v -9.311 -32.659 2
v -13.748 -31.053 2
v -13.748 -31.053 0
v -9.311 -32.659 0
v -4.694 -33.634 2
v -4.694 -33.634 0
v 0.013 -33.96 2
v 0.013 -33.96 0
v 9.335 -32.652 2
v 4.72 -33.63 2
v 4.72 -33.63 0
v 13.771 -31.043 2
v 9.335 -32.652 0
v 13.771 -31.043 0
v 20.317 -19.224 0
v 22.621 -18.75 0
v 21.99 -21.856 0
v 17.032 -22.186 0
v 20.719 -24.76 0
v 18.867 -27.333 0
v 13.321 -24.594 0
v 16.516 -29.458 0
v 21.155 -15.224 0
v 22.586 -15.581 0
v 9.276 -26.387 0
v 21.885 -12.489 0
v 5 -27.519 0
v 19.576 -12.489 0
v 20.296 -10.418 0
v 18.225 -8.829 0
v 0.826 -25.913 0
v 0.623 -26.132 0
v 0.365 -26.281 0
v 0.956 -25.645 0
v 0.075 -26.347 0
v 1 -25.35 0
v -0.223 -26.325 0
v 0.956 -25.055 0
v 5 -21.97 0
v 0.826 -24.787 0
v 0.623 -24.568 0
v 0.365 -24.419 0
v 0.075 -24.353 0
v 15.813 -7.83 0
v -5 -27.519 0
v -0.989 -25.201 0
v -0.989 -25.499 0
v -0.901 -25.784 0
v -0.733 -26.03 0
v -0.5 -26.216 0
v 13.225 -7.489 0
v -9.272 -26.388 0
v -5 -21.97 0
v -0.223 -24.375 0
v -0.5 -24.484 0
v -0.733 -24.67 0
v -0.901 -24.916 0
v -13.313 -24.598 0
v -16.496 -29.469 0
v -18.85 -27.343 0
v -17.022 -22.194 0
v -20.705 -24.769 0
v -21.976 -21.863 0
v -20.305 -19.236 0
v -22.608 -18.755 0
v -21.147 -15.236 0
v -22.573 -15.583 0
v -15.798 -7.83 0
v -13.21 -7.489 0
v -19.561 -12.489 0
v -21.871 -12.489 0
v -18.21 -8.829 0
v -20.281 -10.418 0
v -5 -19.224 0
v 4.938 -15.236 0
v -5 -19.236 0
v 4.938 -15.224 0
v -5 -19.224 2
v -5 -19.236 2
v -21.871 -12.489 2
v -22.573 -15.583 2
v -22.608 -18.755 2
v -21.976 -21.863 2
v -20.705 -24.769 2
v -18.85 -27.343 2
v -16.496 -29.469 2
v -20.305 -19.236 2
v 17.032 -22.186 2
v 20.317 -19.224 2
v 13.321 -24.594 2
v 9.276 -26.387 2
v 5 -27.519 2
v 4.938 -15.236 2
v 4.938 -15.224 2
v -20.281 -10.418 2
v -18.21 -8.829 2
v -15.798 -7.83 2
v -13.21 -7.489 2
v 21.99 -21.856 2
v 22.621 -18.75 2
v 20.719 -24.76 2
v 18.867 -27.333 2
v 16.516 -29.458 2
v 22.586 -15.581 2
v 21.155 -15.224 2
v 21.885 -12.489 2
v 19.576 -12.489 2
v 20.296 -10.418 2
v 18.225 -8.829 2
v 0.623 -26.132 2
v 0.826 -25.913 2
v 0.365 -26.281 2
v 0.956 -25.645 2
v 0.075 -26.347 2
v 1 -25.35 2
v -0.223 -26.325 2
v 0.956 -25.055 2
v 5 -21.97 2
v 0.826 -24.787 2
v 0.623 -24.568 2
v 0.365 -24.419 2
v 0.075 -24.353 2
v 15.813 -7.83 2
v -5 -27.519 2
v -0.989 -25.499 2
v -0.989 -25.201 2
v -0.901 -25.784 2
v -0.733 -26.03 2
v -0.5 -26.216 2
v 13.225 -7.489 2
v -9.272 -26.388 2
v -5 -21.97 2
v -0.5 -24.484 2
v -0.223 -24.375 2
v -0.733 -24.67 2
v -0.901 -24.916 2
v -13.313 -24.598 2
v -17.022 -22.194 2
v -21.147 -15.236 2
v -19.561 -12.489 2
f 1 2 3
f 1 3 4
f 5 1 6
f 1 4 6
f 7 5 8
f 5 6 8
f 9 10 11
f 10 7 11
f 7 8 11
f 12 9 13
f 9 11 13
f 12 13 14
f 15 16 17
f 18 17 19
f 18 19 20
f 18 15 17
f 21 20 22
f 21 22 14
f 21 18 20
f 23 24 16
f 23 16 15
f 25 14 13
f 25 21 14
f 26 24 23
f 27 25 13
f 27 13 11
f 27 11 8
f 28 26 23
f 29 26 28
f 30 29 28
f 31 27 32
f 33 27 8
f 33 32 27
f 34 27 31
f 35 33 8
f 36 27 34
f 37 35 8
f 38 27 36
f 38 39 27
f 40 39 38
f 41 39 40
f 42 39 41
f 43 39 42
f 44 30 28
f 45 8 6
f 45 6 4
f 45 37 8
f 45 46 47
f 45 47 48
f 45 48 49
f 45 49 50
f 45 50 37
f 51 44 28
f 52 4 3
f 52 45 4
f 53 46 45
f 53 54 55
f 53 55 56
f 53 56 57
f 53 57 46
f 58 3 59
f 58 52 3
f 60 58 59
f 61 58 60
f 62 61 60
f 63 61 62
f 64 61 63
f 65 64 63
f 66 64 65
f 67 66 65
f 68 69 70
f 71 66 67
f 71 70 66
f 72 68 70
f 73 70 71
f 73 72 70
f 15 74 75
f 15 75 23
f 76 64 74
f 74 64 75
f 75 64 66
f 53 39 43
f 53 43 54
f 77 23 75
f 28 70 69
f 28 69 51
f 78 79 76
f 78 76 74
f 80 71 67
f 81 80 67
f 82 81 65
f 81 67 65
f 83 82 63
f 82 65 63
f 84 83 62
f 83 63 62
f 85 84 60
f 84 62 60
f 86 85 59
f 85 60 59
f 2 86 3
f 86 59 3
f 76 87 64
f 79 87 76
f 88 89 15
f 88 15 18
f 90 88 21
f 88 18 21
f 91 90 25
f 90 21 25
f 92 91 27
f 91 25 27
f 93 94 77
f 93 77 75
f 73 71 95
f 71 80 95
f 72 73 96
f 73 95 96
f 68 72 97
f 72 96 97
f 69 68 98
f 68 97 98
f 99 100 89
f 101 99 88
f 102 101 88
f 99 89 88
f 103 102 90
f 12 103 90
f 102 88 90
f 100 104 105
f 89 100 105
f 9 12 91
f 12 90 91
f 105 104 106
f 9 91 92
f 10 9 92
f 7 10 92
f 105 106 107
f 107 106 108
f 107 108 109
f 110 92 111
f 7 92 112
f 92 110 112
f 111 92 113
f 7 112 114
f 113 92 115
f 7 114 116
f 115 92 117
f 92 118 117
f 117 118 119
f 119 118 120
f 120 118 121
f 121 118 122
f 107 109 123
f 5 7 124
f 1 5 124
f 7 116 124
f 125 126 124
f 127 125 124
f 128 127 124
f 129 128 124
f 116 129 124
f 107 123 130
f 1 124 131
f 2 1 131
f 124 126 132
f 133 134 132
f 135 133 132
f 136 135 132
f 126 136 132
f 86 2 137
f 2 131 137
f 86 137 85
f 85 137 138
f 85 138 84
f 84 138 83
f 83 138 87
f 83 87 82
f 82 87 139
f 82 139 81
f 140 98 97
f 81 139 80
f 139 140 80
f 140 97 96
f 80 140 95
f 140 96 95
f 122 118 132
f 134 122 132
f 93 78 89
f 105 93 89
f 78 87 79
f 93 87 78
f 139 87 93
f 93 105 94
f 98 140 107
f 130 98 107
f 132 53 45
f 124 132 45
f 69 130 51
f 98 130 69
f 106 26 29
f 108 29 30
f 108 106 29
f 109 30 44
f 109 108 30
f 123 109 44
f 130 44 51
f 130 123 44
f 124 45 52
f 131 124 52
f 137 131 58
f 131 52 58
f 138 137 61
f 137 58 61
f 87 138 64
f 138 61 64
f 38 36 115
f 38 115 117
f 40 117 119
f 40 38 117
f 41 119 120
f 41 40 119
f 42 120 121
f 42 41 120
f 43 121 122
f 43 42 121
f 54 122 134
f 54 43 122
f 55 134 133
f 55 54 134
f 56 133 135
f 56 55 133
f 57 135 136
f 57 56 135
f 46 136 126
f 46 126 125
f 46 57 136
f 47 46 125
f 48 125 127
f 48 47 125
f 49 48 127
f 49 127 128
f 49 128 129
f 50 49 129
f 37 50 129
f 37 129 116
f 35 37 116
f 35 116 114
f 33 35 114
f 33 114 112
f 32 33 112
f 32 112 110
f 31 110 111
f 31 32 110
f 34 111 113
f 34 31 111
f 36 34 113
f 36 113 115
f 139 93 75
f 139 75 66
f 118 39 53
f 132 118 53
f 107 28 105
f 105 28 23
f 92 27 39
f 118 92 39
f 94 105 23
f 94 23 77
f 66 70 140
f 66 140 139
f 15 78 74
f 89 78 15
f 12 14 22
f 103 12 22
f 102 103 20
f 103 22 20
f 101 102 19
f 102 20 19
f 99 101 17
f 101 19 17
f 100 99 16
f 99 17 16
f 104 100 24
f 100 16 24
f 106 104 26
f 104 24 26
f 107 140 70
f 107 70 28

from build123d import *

# Parameters (mm, degrees)
SKETCH1_R           = 0.9999999999999973
BOSS_EXTRUDE1_DEPTH = 2
BOSS_EXTRUDE2_DEPTH = 2
BOSS_EXTRUDE3_DEPTH = 2
BOSS_EXTRUDE4_DEPTH = 2
BOSS_EXTRUDE6_DEPTH = 2
CUT_EXTRUDE5_DEPTH  = 10
CUT_EXTRUDE6_DEPTH  = 10
FILLET3_R           = 10
FILLET4_R           = 15


with BuildPart() as part:
    # Sketch1 → Boss-Extrude1 (new body)
    with BuildSketch(Plane.XY):
        with BuildLine():
            Line((-25.026699742262835, -12.489403509000002), (-31.579999999831756, -12.489403509000002))
            ThreePointArc((-31.579999999831788, -12.489403509000118), (-4.3876e-13, -33.96), (31.579999999831465, -12.489403509000935))
            Line((31.579999999831173, -12.489403509000002), (25.026699742262835, -12.489403509000002))
            ThreePointArc((25.026699742262835, -12.489403508999999), (16.78917371704707, -22.3706179149977), (5.000000000000879, -27.51946402094327))
            Line((5.000000000000001, -27.519464020943122), (5.000000000000001, -21.97))
            Line((5.000000000000001, -21.97), (0, -21.97))
            Line((0, -21.97), (-5.000000000000001, -21.970000000000002))
            Line((-5.000000000000001, -21.970000000000002), (-5.000000000000001, -27.519464020943126))
            ThreePointArc((-5.000000000000872, -27.519464020943275), (-16.789173717047063, -22.370617914997695), (-25.02669974226283, -12.489403508999999))
        make_face()
        with Locations((2.25e-15, -25.35)):
            Circle(SKETCH1_R, mode=Mode.SUBTRACT)
    extrude(amount=BOSS_EXTRUDE1_DEPTH)

    # Sketch2 → Boss-Extrude2 (add)
    with BuildSketch(Plane.XY.offset(2)):
        with BuildLine():
            Line((-31.57999999983184, -12.489403509000002), (-25.026699742262828, -12.489403509000002))
            Line((-25.026699742262828, -12.489403509000002), (0, -12.489403509000002))
            Line((0, -12.489403509000002), (25.026699742262828, -12.489403509000002))
            Line((25.026699742262828, -12.489403509000002), (31.57999999983184, -12.489403509000002))
            ThreePointArc((31.57999999983184, -12.489403509000002), (30.972585231224635, -9.734010611787788), (29.262941504232284, -7.489403509000002))
            Line((29.262941504232288, -7.489403509000003), (-29.262941504232284, -7.489403509000003))
            ThreePointArc((-29.262941504232284, -7.489403509000002), (-30.972585231224635, -9.734010611787788), (-31.57999999983184, -12.489403509000002))
        make_face()
    extrude(amount=-BOSS_EXTRUDE2_DEPTH)

    # Sketch3 → Boss-Extrude3 (add)
    with BuildSketch(Plane.XY.offset(2)):
        Polygon((-24.813781653352383, -19.23578932070869), (-5, -19.235789320708687), (-5.000000000000001, -19.223614188291315), (25.52831463289919, -19.223614188291315), (25.52831463289919, -15.223614188291313), (4.937516262759692, -15.223614188291313), (4.937516262759691, -15.235789320708687), (-24.813781653352386, -15.235789320708694), align=None)
    extrude(amount=-BOSS_EXTRUDE3_DEPTH)

    # Sketch4 → Boss-Extrude4 (add)
    with BuildSketch(Plane.XY):
        Polygon((26.752232503098107, -20.918882764148314), (23.464067657719866, -15.223614188291315), (21.15466658096137, -15.223614188291313), (25.020181695529228, -21.918882764148307), align=None)
        Polygon((21.15466658096137, -15.223614188291313), (23.464067657719863, -15.223614188291313), (18.99871904006177, -7.489403509000002), (17.266668232492894, -8.489403508999997), align=None)
    extrude(amount=BOSS_EXTRUDE4_DEPTH)

    # Sketch6 → Boss-Extrude6 (add)
    with BuildSketch(Plane(origin=(0, 0, 0), x_dir=(-1, 0, 0), z_dir=(0, 0, -1))):
        Polygon((21.146762799182063, -15.235789320708694), (23.45616387594056, -15.235789320708694), (22.962540836382626, -14.38080913640776), (21.870537288251985, -12.489403509), (19.561136211493483, -12.489403509000002), align=None)
    extrude(amount=-BOSS_EXTRUDE6_DEPTH)

    # Sketch7 → Cut-Extrude5 (cut)
    with BuildSketch(Plane(origin=(0, 0, 0), x_dir=(-1, 0, 0), z_dir=(0, 0, -1))):
        with BuildLine():
            Line((23.456163875940437, -15.235789320708776), (26.743640561861312, -20.92986596942182))
            ThreePointArc((26.743640561861444, -20.929865969421787), (29.465608999795766, -16.88370475550775), (31.579999999831838, -12.489403509000006))
            ThreePointArc((31.579999999831834, -12.489403508999994), (30.972585231224627, -9.734010611787786), (29.262941504232284, -7.489403509000004))
            Line((29.262941504232284, -7.489403509000003), (18.983785942303626, -7.489403509000003))
            Line((18.98378594230363, -7.4894035090000095), (21.87053728825184, -12.489403509000091))
            Line((21.87053728825199, -12.489403509000002), (25.026699742262828, -12.489403509000002))
            ThreePointArc((25.02669974226283, -12.489403509000006), (24.280293962635962, -13.884819951586834), (23.456163875940568, -15.235789320708696))
        make_face()
    extrude(amount=-CUT_EXTRUDE5_DEPTH, mode=Mode.SUBTRACT)

    # Sketch8 → Cut-Extrude6 (cut)
    with BuildSketch(Plane(origin=(0, 0, 0), x_dir=(-1, 0, 0), z_dir=(0, 0, -1))):
        with BuildLine():
            Line((-26.752232503097716, -20.918882764147654), (-23.464067657719863, -15.223614188291315))
            ThreePointArc((-23.46406765771987, -15.223614188291315), (-24.283896058283027, -13.878519093567089), (-25.026699742262828, -12.489403509000002))
            Line((-25.026699742262828, -12.489403509000002), (-21.88547038600989, -12.489403509000002))
            Line((-21.88547038600989, -12.489403509000002), (-18.998719040061772, -7.4894035090000015))
            Line((-18.998719040061772, -7.489403509000003), (-29.262941504232288, -7.489403509000003))
            ThreePointArc((-29.262941504232284, -7.489403509000002), (-30.97258523122463, -9.73401061178779), (-31.57999999983184, -12.489403509000002))
            ThreePointArc((-31.57999999983184, -12.489403509000002), (-29.469074761896252, -16.877654833470505), (-26.75223250309883, -20.9188827641474))
        make_face()
    extrude(amount=-CUT_EXTRUDE6_DEPTH, mode=Mode.SUBTRACT)

    # Fillet3
    fillet3_edges = [part.edges().sort_by_distance(p)[0] for p in [
        (-18.983785942303626, -7.489403509000006, 1),
        (18.998719040061772, -7.489403509000002, 1),
    ]]
    fillet(fillet3_edges, radius=FILLET3_R)

    # Fillet4
    # the kernel refuses this fillet: 15 mm, written as the material it takes off along each edge
    with BuildSketch(Plane(origin=(26.752232503098277, -20.91888276414753, -41.15536178864485), x_dir=(-0.5000000000000459, 0.8660254037844121, 0), z_dir=(0, 0, 1))) as fillet4_piece_1:
        with BuildLine():
            CenterArc((12.63895144979885, 14.71592649800607), FILLET4_R, 173.92282911126543, 84.90866305824733)
            ThreePointArc((-2.2767516311276927, 16.30394463443854), (-2.1412465863768713, 8.011927210685023), (0, 0))
            Line((0, 0), (9.73352423417586, 7.4e-16))
        make_face()
    extrude(amount=84.3107235772897, mode=Mode.SUBTRACT)
    with BuildSketch(Plane(origin=(-26.743640561861376, -20.929865969421805, -41.183176669180206), x_dir=(0.7889080559016987, -0.6145112524058467, 0), z_dir=(0, 0, 1))) as fillet4_piece_2:
        with BuildLine():
            CenterArc((12.835180855907009, 14.552123643012767), FILLET4_R, 199.06172243650428, 84.97473929921648)
            Line((-1.342328727646797, 9.653325626331542), (0, 0))
            ThreePointArc((0, 0), (8.236635333836043, -1.0139920722190925), (16.473270667672082, 5.9e-16))
        make_face()
    extrude(amount=84.36635333836041, mode=Mode.SUBTRACT)


solid = part.part
